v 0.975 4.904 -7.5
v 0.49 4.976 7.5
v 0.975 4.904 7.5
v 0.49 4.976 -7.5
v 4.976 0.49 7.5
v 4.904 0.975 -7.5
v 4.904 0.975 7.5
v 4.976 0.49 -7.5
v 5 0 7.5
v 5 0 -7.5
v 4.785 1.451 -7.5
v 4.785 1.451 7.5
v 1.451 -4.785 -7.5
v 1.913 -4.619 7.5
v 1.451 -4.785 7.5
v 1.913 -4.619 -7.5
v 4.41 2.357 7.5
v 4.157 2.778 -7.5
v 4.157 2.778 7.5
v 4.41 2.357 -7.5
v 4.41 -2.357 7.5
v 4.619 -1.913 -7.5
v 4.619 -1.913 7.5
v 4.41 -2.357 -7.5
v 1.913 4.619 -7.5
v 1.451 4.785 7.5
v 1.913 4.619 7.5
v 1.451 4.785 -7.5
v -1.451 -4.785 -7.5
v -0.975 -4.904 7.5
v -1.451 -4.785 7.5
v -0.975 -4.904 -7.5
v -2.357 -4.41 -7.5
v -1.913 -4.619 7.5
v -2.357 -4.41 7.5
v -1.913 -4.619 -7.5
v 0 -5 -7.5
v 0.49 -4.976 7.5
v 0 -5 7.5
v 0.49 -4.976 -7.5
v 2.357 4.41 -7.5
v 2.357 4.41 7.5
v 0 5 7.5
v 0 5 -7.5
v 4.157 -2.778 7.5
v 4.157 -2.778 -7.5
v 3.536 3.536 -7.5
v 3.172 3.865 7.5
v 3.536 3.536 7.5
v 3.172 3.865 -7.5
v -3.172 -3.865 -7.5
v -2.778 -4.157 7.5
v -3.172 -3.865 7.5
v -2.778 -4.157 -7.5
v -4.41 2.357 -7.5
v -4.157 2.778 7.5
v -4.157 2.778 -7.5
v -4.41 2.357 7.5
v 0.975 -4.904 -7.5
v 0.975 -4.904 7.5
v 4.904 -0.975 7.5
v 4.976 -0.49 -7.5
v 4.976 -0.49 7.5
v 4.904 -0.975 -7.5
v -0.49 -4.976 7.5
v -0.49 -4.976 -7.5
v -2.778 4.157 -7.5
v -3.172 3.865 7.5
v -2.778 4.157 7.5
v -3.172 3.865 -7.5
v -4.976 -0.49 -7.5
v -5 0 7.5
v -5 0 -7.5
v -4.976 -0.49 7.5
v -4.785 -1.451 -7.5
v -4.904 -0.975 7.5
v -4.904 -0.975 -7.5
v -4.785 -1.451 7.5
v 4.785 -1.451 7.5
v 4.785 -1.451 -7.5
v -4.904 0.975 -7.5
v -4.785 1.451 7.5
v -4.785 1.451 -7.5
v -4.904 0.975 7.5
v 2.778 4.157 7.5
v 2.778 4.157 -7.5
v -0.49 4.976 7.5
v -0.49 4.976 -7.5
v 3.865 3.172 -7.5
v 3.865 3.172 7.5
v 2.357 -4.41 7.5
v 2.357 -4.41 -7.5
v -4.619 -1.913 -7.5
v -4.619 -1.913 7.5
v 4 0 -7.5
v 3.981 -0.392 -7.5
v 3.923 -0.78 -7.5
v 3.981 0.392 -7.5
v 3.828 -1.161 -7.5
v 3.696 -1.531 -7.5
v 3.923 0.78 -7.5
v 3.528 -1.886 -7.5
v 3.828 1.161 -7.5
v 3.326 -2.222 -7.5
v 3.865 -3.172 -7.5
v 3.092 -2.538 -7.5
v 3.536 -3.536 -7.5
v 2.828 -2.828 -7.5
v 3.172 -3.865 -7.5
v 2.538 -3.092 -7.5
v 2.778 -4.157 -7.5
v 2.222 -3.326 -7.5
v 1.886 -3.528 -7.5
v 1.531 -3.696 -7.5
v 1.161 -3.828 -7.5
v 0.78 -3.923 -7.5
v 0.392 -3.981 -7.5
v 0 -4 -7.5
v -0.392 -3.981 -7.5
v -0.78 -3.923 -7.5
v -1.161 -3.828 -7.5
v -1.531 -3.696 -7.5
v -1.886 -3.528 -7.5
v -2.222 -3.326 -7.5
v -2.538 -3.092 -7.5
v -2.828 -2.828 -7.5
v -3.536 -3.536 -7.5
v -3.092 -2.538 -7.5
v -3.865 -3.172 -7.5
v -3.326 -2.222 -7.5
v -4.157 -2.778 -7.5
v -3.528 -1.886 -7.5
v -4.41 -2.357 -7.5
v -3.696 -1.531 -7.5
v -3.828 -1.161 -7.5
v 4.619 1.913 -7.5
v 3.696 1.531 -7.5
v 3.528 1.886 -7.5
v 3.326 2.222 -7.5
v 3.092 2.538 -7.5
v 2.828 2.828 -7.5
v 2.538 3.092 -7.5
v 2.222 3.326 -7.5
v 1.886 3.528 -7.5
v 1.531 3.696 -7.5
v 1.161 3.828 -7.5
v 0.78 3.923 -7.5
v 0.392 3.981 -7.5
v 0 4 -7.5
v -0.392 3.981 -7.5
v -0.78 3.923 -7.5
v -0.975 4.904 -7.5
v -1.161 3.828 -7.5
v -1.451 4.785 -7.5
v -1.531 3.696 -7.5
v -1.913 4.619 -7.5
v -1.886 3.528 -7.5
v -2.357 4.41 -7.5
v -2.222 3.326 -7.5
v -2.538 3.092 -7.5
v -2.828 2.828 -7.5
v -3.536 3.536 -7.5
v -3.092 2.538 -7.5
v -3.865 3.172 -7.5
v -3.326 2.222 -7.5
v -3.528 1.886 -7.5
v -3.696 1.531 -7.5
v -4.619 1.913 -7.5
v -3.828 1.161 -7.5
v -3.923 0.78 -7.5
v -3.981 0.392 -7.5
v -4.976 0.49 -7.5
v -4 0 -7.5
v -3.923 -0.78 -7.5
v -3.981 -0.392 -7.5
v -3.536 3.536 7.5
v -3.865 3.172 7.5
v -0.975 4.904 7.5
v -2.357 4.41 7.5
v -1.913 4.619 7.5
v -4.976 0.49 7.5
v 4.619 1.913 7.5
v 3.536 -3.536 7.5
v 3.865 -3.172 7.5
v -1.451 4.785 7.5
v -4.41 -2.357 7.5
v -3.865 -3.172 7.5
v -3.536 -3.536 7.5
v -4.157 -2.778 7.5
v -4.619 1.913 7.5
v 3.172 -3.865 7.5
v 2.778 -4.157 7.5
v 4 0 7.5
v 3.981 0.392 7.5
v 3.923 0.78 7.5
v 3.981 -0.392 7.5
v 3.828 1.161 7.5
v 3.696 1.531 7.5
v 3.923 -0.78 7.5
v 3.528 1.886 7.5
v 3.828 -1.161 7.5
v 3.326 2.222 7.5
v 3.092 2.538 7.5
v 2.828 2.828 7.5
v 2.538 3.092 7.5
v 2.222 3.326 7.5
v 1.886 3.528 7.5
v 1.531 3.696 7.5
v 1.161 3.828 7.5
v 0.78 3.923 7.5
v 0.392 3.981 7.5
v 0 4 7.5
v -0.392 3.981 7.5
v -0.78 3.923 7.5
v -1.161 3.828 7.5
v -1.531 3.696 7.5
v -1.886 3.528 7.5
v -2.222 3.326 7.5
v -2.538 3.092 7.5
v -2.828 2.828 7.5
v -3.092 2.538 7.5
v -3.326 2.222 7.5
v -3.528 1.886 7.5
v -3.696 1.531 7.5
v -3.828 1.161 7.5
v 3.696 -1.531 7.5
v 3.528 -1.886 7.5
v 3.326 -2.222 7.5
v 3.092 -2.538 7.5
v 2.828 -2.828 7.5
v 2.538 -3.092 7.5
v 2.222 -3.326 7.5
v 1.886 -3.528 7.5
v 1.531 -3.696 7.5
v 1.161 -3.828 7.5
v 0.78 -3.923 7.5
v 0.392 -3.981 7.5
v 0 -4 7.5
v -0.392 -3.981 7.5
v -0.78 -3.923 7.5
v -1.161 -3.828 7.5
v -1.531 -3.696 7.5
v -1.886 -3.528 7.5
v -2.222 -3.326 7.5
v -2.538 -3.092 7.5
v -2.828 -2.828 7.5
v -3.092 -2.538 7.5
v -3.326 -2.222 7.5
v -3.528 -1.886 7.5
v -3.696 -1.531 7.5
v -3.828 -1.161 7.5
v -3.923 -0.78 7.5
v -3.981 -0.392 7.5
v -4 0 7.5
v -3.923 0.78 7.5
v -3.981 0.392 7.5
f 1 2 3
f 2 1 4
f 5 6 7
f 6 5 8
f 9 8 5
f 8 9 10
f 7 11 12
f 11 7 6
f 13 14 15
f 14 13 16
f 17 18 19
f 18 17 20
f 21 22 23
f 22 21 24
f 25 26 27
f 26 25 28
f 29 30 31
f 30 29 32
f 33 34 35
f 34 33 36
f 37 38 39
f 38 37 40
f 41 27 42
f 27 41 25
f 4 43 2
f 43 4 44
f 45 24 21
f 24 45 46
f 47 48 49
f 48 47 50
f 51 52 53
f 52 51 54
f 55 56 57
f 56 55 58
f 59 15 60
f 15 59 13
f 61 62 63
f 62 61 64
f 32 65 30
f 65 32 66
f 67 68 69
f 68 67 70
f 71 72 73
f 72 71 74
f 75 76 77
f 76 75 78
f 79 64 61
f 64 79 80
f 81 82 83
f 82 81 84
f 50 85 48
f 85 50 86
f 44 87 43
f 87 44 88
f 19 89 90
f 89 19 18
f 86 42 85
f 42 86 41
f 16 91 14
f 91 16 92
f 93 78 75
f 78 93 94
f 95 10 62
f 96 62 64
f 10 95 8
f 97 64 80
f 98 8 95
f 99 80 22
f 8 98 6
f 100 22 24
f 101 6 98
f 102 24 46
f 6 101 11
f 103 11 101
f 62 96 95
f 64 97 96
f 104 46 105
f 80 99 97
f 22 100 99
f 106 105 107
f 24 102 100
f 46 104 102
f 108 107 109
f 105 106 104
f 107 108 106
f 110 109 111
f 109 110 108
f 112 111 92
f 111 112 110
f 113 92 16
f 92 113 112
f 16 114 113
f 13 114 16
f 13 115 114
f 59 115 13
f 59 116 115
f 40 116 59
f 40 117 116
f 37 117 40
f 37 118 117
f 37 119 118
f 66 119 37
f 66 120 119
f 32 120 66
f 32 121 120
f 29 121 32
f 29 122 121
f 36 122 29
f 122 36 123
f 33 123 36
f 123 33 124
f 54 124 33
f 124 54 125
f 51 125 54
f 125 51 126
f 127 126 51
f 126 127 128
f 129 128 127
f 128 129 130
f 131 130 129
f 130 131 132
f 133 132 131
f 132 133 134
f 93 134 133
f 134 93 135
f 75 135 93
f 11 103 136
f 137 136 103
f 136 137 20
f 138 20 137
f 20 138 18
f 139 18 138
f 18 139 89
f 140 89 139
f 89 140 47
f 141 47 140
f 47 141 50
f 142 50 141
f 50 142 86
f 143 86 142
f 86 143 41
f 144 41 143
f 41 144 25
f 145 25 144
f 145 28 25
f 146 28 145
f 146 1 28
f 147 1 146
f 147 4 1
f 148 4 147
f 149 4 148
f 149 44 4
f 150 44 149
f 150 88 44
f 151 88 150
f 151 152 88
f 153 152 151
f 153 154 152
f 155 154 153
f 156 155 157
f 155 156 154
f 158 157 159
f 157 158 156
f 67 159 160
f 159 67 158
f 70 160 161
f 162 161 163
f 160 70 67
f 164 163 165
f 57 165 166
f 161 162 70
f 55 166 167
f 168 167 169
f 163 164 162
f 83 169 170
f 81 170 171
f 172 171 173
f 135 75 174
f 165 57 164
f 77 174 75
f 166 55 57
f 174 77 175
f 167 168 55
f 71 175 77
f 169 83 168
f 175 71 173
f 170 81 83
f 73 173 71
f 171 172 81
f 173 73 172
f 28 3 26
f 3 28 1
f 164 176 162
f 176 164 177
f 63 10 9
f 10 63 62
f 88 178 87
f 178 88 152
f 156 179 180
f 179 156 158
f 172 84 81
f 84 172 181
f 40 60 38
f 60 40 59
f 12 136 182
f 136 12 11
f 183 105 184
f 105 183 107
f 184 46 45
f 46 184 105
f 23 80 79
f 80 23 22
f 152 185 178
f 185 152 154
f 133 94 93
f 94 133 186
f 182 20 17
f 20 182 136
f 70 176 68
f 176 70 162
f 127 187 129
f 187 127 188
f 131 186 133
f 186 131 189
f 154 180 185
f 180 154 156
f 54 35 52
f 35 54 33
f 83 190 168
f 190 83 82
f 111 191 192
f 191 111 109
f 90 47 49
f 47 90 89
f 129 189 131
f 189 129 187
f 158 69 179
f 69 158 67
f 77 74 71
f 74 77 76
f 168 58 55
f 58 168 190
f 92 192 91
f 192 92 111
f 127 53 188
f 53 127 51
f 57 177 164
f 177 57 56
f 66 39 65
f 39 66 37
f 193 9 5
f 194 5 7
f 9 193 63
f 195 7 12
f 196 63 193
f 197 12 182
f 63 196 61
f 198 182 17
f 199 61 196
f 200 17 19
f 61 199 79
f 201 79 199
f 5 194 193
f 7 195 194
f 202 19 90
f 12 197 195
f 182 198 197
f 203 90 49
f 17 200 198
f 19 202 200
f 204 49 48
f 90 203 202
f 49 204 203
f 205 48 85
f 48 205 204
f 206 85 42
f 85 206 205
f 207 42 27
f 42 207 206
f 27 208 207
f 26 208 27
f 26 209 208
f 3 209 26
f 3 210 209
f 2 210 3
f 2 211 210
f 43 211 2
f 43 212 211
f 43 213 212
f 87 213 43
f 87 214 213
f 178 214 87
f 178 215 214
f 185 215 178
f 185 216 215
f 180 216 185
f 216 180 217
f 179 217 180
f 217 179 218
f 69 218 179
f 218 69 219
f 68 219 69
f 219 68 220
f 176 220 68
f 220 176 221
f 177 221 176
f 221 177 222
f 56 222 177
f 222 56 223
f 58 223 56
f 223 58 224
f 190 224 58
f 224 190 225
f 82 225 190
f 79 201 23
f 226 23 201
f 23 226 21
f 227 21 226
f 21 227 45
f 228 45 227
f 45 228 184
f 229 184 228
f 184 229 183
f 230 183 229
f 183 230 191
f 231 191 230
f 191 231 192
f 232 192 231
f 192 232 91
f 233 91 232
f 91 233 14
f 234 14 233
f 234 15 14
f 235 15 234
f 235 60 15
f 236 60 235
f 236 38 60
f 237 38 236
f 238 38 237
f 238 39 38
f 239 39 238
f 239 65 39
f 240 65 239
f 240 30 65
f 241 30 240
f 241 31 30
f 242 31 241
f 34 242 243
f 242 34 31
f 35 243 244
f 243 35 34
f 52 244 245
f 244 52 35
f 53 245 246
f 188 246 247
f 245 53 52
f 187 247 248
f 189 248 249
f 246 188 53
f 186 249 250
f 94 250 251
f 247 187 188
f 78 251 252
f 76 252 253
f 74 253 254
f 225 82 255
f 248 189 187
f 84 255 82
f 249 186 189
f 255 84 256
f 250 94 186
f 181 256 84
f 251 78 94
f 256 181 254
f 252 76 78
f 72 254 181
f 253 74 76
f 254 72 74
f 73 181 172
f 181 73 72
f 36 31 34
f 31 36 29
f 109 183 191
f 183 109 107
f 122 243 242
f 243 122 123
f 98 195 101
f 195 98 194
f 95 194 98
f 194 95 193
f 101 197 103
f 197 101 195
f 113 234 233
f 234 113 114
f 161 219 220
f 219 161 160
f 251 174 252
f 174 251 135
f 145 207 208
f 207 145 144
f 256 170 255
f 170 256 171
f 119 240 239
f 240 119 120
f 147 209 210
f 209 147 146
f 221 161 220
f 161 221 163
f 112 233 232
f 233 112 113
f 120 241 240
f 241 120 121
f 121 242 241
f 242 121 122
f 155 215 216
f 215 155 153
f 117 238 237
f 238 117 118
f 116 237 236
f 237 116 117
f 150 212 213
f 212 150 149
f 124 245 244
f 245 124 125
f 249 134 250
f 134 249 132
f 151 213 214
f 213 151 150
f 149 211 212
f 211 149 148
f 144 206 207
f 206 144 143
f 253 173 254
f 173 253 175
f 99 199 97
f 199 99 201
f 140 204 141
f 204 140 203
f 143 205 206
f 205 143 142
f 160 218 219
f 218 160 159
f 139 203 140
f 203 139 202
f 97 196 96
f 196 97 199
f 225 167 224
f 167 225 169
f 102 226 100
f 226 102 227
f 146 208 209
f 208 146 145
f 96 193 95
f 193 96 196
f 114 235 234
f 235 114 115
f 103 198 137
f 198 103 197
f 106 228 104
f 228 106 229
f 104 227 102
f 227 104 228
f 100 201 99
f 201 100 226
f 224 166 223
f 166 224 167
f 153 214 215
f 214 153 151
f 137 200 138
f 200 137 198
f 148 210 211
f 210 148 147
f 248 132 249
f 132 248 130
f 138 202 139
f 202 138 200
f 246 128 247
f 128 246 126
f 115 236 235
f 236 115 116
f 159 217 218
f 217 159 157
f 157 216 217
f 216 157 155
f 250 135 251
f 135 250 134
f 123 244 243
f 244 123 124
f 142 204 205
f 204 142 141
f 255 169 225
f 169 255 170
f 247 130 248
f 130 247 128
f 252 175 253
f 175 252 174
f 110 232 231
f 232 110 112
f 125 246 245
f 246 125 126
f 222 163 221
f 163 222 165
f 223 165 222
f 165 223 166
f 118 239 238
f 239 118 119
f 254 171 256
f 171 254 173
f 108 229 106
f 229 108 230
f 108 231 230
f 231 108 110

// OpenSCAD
// Parameters
length = 15; //[8:30:1]
outer_diameter = 10; //[5:20:1]
inner_diameter = 8; //[4:18:1]
forced_inner_diameter = 0; //[0:18:1]
center = 1; //[0:1:1]
overlap = 1; //[0.5:2:0.5]
end_face_thickness = 0.5; //[0.2:2:0.1]

// Tubing - complete geometry
module tubing() {
  color([0.85, 0.85, 0.8]) {
    // Tubing shell
    difference() {
      translate([0, 0, center == 1 ? 0 : length / 2])
        cylinder(h=length, r=outer_diameter / 2, center=true, $fn=64);
      translate([0, 0, center == 1 ? 0 : length / 2])
        cylinder(h=length + 2 * overlap, r=(forced_inner_diameter > 0 ? forced_inner_diameter : inner_diameter) / 2, center=true, $fn=64);
    }
    
    // End face rings
    union() {
      translate([0, 0, (center == 1 ? length / 2 : length) - end_face_thickness / 2])
        difference() {
          cylinder(h=end_face_thickness, r=outer_diameter / 2, center=true, $fn=64);
          cylinder(h=end_face_thickness + 2 * overlap, r=(forced_inner_diameter > 0 ? forced_inner_diameter : inner_diameter) / 2, center=true, $fn=64);
        }
      translate([0, 0, (center == 1 ? -length / 2 : 0) + end_face_thickness / 2])
        difference() {
          cylinder(h=end_face_thickness, r=outer_diameter / 2, center=true, $fn=64);
          cylinder(h=end_face_thickness + 2 * overlap, r=(forced_inner_diameter > 0 ? forced_inner_diameter : inner_diameter) / 2, center=true, $fn=64);
        }
    }
  }
}

// Assembly
module assembly() {
  tubing();
}

assembly();
